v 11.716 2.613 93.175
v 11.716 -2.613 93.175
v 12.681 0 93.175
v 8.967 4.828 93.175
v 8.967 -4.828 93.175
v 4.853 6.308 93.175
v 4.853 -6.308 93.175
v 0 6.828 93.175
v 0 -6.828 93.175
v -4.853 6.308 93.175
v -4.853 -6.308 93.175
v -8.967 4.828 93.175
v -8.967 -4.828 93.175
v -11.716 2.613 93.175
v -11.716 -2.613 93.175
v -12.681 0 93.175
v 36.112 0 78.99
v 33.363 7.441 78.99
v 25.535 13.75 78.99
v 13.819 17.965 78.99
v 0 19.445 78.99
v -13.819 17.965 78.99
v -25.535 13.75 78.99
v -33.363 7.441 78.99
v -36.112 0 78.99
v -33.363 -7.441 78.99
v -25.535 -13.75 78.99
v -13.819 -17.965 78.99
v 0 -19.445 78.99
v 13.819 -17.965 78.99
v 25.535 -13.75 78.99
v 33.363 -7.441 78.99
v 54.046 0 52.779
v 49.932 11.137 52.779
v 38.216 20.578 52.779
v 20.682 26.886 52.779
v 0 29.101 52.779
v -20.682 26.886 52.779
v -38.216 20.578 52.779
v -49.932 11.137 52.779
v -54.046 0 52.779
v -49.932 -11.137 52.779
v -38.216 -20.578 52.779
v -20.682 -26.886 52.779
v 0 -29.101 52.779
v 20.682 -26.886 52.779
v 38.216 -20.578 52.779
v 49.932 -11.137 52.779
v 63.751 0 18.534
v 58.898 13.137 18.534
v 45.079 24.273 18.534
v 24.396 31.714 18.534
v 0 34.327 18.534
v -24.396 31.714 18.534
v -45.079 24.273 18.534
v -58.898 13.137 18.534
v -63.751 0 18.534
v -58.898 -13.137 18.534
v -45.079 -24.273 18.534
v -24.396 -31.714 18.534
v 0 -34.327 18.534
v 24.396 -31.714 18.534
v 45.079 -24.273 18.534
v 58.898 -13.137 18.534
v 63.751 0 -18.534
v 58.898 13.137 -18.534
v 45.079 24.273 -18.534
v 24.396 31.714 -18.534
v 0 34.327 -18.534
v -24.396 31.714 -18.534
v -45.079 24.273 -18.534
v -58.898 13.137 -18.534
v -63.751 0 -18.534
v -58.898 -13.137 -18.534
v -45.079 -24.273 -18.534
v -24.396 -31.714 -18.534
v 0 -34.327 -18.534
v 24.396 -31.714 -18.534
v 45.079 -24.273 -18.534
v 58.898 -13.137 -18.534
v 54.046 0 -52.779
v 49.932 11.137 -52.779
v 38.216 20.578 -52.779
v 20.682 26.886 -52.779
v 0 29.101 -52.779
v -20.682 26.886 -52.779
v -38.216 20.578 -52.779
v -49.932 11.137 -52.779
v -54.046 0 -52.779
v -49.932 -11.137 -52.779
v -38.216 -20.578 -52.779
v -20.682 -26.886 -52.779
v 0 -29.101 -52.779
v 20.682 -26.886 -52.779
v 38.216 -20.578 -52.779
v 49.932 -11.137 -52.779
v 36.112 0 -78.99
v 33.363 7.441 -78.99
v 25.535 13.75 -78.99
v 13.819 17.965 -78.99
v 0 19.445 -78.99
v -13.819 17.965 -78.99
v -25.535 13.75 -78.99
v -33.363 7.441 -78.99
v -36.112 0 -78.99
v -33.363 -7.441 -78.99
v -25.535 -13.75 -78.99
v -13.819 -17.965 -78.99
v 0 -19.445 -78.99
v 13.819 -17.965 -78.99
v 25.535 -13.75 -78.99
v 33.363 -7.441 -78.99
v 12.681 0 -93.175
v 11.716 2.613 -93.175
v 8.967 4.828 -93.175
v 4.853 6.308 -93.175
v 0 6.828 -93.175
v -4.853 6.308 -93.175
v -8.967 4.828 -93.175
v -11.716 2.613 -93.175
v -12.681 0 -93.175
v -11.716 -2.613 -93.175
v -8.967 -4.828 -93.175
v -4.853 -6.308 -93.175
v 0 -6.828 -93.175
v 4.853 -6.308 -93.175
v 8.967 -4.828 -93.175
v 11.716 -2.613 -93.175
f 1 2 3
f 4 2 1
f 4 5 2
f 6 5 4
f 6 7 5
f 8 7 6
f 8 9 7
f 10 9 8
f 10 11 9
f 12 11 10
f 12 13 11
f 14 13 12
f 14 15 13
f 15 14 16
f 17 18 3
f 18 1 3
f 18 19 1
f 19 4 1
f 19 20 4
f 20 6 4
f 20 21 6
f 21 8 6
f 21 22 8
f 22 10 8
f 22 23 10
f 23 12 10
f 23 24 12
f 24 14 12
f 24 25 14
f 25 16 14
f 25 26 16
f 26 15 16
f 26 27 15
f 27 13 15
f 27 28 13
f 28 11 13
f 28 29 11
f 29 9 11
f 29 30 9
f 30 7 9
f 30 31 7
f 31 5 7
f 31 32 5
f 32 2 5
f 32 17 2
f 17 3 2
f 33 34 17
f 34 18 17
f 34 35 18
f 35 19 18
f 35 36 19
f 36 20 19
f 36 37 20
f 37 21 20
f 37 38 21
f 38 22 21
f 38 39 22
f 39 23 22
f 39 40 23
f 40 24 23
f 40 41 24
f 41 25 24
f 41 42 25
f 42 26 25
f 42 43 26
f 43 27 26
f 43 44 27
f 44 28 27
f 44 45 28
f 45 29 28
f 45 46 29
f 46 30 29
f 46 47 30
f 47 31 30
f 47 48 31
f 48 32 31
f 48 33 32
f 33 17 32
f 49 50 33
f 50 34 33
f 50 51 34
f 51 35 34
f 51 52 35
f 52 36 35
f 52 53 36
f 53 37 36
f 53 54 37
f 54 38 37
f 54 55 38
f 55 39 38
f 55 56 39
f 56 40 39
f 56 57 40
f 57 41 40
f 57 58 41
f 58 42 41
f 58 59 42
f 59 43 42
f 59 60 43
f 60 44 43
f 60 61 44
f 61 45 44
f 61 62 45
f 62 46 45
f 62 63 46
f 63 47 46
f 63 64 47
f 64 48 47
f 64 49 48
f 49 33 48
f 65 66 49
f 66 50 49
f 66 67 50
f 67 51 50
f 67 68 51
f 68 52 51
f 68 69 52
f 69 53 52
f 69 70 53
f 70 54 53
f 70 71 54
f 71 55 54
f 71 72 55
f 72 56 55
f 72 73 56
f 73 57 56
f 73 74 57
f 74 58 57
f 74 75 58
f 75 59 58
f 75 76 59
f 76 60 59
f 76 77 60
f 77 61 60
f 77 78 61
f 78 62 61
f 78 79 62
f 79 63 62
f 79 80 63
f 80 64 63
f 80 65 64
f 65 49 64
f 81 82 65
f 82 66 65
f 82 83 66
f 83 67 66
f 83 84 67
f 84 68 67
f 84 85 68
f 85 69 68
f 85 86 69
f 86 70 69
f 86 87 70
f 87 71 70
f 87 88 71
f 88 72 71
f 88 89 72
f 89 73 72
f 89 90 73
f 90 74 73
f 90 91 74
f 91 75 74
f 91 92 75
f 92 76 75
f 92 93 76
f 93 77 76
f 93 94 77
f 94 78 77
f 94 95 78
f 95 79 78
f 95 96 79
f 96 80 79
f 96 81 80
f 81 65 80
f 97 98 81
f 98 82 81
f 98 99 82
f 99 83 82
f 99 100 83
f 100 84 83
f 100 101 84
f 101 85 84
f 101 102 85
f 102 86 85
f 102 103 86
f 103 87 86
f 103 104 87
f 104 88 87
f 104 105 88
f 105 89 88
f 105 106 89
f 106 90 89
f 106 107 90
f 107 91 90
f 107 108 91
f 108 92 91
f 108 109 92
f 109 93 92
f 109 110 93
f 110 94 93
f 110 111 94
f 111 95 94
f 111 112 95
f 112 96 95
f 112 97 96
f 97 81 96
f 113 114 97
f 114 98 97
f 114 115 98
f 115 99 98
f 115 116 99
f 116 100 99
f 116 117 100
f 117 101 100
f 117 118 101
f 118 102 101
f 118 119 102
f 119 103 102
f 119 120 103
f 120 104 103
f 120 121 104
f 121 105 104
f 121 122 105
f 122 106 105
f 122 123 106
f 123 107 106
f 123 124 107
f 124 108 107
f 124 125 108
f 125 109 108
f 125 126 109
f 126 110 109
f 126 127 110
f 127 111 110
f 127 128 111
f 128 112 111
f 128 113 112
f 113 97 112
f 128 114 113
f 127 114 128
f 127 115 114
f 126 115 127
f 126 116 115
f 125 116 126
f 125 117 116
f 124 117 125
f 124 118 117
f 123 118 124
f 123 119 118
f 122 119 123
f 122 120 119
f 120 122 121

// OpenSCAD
// Generated by SolidPython 1.0.1 on 2020-07-29 00:46:50


scale(v = [13, 7, 19]) {
	sphere(r = 5);
}
/***********************************************
*********      SolidPython code:      **********
************************************************
 
# import packages: SolidPython
from solid import *
from solid.utils import *
from itertools import chain, combinations, permutations


class Resize:

    def __init__(self, scad_file):
        self.scad_file = scad_file
        #self.scad_file = import_scad(scad_file)
        # cone/cylinder param:
        self.r1 = 0
        self.r2 = 0
        self.h = 0
        # rectangular prism param:
        self.w = 0
        self.l = 0
        # ellipse param:
        self.r = 0

    # import OpenScad code (file name corresponds to shape)


    # classify shape + parameters
    def assign(self, param1, param2, param3):
        if self.scad_file == 'cone.scad':
            self.r1 = param1
            self.r2 = param2
            self.h = param3
        elif self.scad_file == 'cylinder.scad':
            self.r1 = param1
            self.r2 = param2
            self.h = param3
        elif self.scad_file == 'rectangularPrism.scad':
            self.h = param1
            self.l = param2
            self.w = param3
        else:
            self.r = param1
            self.h = param2

    # resize parameters
    def iterate(self):
        x = range(3, 20, 2)
        i = 1
        if self.scad_file == 'cone.scad':
            tempList = list(permutations(x, 2))
            for temp in tempList:
                param1 = temp[0]
                param2 = temp[1]
                filepath = 'produced_scad_files/' + 'cone' + str(param1) + '_' + str(param2) + '_' + '.scad'
                scad_render_to_file(cylinder(h=param1, r1=param2, r2=0), filepath)

        elif self.scad_file == 'cylinder.scad':
            tempList = list(permutations(x, 3))
            for temp in tempList:
                param1 = temp[0]
                param2 = temp[1]
                filepath = 'produced_scad_files/' + 'cylinder' + str(param1) + '_' + str(param2) + '_' + '.scad'
                scad_render_to_file(cylinder(h=param1, r1=param2, r2=param2), filepath)

        elif self.scad_file == 'rectangularPrism.scad':
            tempList = list(permutations(x, 3))
            for temp in tempList:
                param1 = temp[0]
                param2 = temp[1]
                param3 = temp[2]
                filepath = 'produced_scad_files/' + 'rectangularPrism' + str(param1) + '_' + str(param2) + '_' + str(
                    param3) + '.scad'
                scad_render_to_file(cube(size=(param1, param2, param3)), filepath)

        elif self.scad_file == 'ellipse.scad':
            tempList = list(permutations(x, 4))
            for temp in tempList:
                param1 = temp[0]
                param2 = temp[1]
                param3 = temp[2]
                param4 = temp[3]
                filepath = 'produced_scad_files/' + 'ellipse' + str(param1) + '_' + str(param2) + '_' + str(param3) + '_' + str(param4) + '.scad'
                scad_render_to_file(scale([param1, param2, param3])(sphere(r=param4)), filepath)

    def render_to_scadfile(self):
        scad_render_to_file(scad, 'example.scad') 
 
************************************************/
